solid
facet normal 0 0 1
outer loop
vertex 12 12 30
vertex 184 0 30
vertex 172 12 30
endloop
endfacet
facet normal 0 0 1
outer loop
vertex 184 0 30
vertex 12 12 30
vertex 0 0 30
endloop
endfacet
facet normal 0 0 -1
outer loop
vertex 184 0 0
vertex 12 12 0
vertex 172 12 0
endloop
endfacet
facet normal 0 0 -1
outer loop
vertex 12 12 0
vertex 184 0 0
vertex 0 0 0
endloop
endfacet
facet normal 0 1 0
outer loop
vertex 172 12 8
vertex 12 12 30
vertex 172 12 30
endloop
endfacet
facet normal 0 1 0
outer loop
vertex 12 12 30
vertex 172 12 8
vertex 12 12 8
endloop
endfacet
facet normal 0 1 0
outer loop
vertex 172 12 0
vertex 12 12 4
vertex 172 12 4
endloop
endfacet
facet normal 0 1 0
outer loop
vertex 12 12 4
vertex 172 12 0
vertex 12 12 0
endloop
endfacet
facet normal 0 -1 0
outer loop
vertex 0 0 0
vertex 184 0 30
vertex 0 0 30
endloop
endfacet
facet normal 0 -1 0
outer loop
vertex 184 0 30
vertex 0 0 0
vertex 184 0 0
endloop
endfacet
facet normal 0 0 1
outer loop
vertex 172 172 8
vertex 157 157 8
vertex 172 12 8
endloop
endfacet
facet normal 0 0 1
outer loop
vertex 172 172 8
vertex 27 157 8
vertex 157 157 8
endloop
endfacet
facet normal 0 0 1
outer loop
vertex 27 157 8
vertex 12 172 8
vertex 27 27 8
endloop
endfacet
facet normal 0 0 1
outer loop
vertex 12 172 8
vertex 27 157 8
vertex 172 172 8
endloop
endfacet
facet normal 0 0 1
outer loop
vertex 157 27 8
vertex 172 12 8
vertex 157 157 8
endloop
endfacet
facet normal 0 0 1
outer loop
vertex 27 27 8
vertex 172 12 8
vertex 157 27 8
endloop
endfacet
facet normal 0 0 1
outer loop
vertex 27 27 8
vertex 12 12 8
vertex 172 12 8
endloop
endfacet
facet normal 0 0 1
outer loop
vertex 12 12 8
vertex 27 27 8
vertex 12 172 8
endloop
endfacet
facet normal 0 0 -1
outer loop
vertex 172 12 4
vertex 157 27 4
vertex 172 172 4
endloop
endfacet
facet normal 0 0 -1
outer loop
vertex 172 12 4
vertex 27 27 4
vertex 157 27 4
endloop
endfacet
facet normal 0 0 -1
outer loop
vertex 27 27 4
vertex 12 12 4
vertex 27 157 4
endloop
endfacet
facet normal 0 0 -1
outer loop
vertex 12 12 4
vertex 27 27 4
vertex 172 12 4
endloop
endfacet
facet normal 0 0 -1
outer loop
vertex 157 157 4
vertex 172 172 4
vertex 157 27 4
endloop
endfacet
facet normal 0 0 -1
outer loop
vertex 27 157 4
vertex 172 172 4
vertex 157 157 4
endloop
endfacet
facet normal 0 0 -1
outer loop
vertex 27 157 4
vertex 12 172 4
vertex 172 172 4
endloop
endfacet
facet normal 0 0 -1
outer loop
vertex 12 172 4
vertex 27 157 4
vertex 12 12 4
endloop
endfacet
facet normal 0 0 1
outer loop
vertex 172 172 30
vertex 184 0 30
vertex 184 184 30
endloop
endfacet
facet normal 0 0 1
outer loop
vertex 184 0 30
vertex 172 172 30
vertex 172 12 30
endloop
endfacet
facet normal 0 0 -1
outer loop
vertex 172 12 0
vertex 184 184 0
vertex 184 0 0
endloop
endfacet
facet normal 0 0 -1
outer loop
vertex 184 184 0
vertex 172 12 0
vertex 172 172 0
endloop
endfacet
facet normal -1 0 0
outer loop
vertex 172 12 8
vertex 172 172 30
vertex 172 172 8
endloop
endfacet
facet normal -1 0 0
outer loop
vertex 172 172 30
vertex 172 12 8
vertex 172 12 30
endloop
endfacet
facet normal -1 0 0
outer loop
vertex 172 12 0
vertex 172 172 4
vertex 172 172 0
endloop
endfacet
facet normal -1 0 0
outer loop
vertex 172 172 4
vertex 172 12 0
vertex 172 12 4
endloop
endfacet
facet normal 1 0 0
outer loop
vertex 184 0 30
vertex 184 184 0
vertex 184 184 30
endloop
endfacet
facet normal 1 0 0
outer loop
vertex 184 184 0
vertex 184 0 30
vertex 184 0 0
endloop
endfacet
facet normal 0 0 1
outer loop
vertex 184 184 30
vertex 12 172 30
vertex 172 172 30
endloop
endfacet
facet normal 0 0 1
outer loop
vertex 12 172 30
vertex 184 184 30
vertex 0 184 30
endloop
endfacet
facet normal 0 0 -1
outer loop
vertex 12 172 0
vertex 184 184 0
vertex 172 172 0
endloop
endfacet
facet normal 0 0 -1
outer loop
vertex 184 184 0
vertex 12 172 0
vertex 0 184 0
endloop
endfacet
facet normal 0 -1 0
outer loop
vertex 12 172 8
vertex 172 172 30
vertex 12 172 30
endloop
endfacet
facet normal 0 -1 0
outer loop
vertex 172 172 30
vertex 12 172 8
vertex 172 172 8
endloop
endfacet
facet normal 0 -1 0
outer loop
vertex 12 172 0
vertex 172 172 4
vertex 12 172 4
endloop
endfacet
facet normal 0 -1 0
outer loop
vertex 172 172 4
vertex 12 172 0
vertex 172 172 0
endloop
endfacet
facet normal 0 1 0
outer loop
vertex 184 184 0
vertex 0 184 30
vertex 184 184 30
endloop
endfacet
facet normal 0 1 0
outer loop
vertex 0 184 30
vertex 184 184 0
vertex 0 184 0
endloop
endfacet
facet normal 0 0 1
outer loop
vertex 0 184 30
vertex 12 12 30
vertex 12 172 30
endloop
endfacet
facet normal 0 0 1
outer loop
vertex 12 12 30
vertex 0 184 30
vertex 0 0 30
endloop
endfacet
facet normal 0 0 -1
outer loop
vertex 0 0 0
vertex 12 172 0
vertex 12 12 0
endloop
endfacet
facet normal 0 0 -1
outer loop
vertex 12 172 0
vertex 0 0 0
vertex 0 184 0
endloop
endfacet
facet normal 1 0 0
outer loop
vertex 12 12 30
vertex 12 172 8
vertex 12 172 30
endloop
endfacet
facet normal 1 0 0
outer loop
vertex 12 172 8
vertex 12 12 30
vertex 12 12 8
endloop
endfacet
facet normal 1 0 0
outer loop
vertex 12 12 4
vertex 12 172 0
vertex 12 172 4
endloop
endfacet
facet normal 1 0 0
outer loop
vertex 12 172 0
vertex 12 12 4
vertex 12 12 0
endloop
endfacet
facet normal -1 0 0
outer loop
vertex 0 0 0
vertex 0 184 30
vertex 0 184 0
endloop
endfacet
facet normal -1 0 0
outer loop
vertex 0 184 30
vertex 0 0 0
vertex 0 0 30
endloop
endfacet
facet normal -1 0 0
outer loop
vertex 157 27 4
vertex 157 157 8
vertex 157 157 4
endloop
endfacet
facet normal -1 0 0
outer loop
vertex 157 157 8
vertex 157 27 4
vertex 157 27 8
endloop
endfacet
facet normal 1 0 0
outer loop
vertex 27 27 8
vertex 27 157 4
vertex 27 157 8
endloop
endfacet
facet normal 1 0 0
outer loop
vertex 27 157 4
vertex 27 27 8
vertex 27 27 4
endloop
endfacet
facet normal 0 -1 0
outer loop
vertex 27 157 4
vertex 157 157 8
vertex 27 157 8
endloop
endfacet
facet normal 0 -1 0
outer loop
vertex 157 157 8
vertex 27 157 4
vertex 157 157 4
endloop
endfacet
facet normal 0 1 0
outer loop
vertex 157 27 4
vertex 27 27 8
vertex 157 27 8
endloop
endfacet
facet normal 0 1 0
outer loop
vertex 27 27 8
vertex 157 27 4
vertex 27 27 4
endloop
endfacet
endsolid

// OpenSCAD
// file: frame.scad
$fa = 1;
$fs = 0.04;

e = 0.01;

module mitered_edge(outer_dimension, height, width) {
    difference() {
        cube([outer_dimension, width, height]);

        // these create the mitered edges
        translate([outer_dimension-25, +25, 0])
        rotate(-45)
            cube([width + 100, width, height]);

        rotate(45)
            cube([width + 100, width, height]);
    }
}

module frame_edge(outer_dimension, height, material_width) {
    difference() {
        mitered_edge(outer_dimension, height, material_width);

        // create the dado 4mm thick by 1/2 material_width
        translate([0, material_width/2, 4])
            cube([outer_dimension, material_width, 4]);
    }
}


module frame(outer_dimension, height, material_width) {
    union() {
        frame_edge(outer_dimension, height, material_width);

        translate([outer_dimension, 0, 0])
        rotate(90)
            frame_edge(outer_dimension, height, material_width);

        translate([outer_dimension, outer_dimension, 0])
        rotate(180)
            frame_edge(outer_dimension, height, material_width);
        
        translate([0, outer_dimension, 0])
        rotate(270)
            frame_edge(outer_dimension, height, material_width);
    }
}
// main file
$fa = 1;
$fs = 0.04;

e = 0.01;

use <frame.scad>

module inner_square(
    outer_dimension,
    inner_dimension,
    material_thickness,
    frame_material_thickness
) {
    length = outer_dimension - frame_material_thickness;

    translate([length/2, length/2, material_thickness/2])
    difference() {
        cube([length, length, material_thickness], center=true);
        cube([inner_dimension, inner_dimension, material_thickness+e], center=true);
    }
}

module frame_back(
    outer_dimension,
    lens_board_dimension_outer,
    lens_board_dimension_inner,
    height,
    frame_material_thickness,
) {
    dado_offset = frame_material_thickness / 2;
    union() {
        frame(outer_dimension, height, frame_material_thickness);

        // move the inner frame to the height of the dado
        translate([dado_offset, dado_offset, 4])
        color("blue")
            inner_square(
                outer_dimension,
                lens_board_dimension_inner,
                4,
                frame_material_thickness
            );
    }
}

frame_back(
    outer_dimension = 184,
    lens_board_dimension_outer = 140,
    lens_board_dimension_inner = 130,
    height = 30,
    frame_material_thickness = 12
);
